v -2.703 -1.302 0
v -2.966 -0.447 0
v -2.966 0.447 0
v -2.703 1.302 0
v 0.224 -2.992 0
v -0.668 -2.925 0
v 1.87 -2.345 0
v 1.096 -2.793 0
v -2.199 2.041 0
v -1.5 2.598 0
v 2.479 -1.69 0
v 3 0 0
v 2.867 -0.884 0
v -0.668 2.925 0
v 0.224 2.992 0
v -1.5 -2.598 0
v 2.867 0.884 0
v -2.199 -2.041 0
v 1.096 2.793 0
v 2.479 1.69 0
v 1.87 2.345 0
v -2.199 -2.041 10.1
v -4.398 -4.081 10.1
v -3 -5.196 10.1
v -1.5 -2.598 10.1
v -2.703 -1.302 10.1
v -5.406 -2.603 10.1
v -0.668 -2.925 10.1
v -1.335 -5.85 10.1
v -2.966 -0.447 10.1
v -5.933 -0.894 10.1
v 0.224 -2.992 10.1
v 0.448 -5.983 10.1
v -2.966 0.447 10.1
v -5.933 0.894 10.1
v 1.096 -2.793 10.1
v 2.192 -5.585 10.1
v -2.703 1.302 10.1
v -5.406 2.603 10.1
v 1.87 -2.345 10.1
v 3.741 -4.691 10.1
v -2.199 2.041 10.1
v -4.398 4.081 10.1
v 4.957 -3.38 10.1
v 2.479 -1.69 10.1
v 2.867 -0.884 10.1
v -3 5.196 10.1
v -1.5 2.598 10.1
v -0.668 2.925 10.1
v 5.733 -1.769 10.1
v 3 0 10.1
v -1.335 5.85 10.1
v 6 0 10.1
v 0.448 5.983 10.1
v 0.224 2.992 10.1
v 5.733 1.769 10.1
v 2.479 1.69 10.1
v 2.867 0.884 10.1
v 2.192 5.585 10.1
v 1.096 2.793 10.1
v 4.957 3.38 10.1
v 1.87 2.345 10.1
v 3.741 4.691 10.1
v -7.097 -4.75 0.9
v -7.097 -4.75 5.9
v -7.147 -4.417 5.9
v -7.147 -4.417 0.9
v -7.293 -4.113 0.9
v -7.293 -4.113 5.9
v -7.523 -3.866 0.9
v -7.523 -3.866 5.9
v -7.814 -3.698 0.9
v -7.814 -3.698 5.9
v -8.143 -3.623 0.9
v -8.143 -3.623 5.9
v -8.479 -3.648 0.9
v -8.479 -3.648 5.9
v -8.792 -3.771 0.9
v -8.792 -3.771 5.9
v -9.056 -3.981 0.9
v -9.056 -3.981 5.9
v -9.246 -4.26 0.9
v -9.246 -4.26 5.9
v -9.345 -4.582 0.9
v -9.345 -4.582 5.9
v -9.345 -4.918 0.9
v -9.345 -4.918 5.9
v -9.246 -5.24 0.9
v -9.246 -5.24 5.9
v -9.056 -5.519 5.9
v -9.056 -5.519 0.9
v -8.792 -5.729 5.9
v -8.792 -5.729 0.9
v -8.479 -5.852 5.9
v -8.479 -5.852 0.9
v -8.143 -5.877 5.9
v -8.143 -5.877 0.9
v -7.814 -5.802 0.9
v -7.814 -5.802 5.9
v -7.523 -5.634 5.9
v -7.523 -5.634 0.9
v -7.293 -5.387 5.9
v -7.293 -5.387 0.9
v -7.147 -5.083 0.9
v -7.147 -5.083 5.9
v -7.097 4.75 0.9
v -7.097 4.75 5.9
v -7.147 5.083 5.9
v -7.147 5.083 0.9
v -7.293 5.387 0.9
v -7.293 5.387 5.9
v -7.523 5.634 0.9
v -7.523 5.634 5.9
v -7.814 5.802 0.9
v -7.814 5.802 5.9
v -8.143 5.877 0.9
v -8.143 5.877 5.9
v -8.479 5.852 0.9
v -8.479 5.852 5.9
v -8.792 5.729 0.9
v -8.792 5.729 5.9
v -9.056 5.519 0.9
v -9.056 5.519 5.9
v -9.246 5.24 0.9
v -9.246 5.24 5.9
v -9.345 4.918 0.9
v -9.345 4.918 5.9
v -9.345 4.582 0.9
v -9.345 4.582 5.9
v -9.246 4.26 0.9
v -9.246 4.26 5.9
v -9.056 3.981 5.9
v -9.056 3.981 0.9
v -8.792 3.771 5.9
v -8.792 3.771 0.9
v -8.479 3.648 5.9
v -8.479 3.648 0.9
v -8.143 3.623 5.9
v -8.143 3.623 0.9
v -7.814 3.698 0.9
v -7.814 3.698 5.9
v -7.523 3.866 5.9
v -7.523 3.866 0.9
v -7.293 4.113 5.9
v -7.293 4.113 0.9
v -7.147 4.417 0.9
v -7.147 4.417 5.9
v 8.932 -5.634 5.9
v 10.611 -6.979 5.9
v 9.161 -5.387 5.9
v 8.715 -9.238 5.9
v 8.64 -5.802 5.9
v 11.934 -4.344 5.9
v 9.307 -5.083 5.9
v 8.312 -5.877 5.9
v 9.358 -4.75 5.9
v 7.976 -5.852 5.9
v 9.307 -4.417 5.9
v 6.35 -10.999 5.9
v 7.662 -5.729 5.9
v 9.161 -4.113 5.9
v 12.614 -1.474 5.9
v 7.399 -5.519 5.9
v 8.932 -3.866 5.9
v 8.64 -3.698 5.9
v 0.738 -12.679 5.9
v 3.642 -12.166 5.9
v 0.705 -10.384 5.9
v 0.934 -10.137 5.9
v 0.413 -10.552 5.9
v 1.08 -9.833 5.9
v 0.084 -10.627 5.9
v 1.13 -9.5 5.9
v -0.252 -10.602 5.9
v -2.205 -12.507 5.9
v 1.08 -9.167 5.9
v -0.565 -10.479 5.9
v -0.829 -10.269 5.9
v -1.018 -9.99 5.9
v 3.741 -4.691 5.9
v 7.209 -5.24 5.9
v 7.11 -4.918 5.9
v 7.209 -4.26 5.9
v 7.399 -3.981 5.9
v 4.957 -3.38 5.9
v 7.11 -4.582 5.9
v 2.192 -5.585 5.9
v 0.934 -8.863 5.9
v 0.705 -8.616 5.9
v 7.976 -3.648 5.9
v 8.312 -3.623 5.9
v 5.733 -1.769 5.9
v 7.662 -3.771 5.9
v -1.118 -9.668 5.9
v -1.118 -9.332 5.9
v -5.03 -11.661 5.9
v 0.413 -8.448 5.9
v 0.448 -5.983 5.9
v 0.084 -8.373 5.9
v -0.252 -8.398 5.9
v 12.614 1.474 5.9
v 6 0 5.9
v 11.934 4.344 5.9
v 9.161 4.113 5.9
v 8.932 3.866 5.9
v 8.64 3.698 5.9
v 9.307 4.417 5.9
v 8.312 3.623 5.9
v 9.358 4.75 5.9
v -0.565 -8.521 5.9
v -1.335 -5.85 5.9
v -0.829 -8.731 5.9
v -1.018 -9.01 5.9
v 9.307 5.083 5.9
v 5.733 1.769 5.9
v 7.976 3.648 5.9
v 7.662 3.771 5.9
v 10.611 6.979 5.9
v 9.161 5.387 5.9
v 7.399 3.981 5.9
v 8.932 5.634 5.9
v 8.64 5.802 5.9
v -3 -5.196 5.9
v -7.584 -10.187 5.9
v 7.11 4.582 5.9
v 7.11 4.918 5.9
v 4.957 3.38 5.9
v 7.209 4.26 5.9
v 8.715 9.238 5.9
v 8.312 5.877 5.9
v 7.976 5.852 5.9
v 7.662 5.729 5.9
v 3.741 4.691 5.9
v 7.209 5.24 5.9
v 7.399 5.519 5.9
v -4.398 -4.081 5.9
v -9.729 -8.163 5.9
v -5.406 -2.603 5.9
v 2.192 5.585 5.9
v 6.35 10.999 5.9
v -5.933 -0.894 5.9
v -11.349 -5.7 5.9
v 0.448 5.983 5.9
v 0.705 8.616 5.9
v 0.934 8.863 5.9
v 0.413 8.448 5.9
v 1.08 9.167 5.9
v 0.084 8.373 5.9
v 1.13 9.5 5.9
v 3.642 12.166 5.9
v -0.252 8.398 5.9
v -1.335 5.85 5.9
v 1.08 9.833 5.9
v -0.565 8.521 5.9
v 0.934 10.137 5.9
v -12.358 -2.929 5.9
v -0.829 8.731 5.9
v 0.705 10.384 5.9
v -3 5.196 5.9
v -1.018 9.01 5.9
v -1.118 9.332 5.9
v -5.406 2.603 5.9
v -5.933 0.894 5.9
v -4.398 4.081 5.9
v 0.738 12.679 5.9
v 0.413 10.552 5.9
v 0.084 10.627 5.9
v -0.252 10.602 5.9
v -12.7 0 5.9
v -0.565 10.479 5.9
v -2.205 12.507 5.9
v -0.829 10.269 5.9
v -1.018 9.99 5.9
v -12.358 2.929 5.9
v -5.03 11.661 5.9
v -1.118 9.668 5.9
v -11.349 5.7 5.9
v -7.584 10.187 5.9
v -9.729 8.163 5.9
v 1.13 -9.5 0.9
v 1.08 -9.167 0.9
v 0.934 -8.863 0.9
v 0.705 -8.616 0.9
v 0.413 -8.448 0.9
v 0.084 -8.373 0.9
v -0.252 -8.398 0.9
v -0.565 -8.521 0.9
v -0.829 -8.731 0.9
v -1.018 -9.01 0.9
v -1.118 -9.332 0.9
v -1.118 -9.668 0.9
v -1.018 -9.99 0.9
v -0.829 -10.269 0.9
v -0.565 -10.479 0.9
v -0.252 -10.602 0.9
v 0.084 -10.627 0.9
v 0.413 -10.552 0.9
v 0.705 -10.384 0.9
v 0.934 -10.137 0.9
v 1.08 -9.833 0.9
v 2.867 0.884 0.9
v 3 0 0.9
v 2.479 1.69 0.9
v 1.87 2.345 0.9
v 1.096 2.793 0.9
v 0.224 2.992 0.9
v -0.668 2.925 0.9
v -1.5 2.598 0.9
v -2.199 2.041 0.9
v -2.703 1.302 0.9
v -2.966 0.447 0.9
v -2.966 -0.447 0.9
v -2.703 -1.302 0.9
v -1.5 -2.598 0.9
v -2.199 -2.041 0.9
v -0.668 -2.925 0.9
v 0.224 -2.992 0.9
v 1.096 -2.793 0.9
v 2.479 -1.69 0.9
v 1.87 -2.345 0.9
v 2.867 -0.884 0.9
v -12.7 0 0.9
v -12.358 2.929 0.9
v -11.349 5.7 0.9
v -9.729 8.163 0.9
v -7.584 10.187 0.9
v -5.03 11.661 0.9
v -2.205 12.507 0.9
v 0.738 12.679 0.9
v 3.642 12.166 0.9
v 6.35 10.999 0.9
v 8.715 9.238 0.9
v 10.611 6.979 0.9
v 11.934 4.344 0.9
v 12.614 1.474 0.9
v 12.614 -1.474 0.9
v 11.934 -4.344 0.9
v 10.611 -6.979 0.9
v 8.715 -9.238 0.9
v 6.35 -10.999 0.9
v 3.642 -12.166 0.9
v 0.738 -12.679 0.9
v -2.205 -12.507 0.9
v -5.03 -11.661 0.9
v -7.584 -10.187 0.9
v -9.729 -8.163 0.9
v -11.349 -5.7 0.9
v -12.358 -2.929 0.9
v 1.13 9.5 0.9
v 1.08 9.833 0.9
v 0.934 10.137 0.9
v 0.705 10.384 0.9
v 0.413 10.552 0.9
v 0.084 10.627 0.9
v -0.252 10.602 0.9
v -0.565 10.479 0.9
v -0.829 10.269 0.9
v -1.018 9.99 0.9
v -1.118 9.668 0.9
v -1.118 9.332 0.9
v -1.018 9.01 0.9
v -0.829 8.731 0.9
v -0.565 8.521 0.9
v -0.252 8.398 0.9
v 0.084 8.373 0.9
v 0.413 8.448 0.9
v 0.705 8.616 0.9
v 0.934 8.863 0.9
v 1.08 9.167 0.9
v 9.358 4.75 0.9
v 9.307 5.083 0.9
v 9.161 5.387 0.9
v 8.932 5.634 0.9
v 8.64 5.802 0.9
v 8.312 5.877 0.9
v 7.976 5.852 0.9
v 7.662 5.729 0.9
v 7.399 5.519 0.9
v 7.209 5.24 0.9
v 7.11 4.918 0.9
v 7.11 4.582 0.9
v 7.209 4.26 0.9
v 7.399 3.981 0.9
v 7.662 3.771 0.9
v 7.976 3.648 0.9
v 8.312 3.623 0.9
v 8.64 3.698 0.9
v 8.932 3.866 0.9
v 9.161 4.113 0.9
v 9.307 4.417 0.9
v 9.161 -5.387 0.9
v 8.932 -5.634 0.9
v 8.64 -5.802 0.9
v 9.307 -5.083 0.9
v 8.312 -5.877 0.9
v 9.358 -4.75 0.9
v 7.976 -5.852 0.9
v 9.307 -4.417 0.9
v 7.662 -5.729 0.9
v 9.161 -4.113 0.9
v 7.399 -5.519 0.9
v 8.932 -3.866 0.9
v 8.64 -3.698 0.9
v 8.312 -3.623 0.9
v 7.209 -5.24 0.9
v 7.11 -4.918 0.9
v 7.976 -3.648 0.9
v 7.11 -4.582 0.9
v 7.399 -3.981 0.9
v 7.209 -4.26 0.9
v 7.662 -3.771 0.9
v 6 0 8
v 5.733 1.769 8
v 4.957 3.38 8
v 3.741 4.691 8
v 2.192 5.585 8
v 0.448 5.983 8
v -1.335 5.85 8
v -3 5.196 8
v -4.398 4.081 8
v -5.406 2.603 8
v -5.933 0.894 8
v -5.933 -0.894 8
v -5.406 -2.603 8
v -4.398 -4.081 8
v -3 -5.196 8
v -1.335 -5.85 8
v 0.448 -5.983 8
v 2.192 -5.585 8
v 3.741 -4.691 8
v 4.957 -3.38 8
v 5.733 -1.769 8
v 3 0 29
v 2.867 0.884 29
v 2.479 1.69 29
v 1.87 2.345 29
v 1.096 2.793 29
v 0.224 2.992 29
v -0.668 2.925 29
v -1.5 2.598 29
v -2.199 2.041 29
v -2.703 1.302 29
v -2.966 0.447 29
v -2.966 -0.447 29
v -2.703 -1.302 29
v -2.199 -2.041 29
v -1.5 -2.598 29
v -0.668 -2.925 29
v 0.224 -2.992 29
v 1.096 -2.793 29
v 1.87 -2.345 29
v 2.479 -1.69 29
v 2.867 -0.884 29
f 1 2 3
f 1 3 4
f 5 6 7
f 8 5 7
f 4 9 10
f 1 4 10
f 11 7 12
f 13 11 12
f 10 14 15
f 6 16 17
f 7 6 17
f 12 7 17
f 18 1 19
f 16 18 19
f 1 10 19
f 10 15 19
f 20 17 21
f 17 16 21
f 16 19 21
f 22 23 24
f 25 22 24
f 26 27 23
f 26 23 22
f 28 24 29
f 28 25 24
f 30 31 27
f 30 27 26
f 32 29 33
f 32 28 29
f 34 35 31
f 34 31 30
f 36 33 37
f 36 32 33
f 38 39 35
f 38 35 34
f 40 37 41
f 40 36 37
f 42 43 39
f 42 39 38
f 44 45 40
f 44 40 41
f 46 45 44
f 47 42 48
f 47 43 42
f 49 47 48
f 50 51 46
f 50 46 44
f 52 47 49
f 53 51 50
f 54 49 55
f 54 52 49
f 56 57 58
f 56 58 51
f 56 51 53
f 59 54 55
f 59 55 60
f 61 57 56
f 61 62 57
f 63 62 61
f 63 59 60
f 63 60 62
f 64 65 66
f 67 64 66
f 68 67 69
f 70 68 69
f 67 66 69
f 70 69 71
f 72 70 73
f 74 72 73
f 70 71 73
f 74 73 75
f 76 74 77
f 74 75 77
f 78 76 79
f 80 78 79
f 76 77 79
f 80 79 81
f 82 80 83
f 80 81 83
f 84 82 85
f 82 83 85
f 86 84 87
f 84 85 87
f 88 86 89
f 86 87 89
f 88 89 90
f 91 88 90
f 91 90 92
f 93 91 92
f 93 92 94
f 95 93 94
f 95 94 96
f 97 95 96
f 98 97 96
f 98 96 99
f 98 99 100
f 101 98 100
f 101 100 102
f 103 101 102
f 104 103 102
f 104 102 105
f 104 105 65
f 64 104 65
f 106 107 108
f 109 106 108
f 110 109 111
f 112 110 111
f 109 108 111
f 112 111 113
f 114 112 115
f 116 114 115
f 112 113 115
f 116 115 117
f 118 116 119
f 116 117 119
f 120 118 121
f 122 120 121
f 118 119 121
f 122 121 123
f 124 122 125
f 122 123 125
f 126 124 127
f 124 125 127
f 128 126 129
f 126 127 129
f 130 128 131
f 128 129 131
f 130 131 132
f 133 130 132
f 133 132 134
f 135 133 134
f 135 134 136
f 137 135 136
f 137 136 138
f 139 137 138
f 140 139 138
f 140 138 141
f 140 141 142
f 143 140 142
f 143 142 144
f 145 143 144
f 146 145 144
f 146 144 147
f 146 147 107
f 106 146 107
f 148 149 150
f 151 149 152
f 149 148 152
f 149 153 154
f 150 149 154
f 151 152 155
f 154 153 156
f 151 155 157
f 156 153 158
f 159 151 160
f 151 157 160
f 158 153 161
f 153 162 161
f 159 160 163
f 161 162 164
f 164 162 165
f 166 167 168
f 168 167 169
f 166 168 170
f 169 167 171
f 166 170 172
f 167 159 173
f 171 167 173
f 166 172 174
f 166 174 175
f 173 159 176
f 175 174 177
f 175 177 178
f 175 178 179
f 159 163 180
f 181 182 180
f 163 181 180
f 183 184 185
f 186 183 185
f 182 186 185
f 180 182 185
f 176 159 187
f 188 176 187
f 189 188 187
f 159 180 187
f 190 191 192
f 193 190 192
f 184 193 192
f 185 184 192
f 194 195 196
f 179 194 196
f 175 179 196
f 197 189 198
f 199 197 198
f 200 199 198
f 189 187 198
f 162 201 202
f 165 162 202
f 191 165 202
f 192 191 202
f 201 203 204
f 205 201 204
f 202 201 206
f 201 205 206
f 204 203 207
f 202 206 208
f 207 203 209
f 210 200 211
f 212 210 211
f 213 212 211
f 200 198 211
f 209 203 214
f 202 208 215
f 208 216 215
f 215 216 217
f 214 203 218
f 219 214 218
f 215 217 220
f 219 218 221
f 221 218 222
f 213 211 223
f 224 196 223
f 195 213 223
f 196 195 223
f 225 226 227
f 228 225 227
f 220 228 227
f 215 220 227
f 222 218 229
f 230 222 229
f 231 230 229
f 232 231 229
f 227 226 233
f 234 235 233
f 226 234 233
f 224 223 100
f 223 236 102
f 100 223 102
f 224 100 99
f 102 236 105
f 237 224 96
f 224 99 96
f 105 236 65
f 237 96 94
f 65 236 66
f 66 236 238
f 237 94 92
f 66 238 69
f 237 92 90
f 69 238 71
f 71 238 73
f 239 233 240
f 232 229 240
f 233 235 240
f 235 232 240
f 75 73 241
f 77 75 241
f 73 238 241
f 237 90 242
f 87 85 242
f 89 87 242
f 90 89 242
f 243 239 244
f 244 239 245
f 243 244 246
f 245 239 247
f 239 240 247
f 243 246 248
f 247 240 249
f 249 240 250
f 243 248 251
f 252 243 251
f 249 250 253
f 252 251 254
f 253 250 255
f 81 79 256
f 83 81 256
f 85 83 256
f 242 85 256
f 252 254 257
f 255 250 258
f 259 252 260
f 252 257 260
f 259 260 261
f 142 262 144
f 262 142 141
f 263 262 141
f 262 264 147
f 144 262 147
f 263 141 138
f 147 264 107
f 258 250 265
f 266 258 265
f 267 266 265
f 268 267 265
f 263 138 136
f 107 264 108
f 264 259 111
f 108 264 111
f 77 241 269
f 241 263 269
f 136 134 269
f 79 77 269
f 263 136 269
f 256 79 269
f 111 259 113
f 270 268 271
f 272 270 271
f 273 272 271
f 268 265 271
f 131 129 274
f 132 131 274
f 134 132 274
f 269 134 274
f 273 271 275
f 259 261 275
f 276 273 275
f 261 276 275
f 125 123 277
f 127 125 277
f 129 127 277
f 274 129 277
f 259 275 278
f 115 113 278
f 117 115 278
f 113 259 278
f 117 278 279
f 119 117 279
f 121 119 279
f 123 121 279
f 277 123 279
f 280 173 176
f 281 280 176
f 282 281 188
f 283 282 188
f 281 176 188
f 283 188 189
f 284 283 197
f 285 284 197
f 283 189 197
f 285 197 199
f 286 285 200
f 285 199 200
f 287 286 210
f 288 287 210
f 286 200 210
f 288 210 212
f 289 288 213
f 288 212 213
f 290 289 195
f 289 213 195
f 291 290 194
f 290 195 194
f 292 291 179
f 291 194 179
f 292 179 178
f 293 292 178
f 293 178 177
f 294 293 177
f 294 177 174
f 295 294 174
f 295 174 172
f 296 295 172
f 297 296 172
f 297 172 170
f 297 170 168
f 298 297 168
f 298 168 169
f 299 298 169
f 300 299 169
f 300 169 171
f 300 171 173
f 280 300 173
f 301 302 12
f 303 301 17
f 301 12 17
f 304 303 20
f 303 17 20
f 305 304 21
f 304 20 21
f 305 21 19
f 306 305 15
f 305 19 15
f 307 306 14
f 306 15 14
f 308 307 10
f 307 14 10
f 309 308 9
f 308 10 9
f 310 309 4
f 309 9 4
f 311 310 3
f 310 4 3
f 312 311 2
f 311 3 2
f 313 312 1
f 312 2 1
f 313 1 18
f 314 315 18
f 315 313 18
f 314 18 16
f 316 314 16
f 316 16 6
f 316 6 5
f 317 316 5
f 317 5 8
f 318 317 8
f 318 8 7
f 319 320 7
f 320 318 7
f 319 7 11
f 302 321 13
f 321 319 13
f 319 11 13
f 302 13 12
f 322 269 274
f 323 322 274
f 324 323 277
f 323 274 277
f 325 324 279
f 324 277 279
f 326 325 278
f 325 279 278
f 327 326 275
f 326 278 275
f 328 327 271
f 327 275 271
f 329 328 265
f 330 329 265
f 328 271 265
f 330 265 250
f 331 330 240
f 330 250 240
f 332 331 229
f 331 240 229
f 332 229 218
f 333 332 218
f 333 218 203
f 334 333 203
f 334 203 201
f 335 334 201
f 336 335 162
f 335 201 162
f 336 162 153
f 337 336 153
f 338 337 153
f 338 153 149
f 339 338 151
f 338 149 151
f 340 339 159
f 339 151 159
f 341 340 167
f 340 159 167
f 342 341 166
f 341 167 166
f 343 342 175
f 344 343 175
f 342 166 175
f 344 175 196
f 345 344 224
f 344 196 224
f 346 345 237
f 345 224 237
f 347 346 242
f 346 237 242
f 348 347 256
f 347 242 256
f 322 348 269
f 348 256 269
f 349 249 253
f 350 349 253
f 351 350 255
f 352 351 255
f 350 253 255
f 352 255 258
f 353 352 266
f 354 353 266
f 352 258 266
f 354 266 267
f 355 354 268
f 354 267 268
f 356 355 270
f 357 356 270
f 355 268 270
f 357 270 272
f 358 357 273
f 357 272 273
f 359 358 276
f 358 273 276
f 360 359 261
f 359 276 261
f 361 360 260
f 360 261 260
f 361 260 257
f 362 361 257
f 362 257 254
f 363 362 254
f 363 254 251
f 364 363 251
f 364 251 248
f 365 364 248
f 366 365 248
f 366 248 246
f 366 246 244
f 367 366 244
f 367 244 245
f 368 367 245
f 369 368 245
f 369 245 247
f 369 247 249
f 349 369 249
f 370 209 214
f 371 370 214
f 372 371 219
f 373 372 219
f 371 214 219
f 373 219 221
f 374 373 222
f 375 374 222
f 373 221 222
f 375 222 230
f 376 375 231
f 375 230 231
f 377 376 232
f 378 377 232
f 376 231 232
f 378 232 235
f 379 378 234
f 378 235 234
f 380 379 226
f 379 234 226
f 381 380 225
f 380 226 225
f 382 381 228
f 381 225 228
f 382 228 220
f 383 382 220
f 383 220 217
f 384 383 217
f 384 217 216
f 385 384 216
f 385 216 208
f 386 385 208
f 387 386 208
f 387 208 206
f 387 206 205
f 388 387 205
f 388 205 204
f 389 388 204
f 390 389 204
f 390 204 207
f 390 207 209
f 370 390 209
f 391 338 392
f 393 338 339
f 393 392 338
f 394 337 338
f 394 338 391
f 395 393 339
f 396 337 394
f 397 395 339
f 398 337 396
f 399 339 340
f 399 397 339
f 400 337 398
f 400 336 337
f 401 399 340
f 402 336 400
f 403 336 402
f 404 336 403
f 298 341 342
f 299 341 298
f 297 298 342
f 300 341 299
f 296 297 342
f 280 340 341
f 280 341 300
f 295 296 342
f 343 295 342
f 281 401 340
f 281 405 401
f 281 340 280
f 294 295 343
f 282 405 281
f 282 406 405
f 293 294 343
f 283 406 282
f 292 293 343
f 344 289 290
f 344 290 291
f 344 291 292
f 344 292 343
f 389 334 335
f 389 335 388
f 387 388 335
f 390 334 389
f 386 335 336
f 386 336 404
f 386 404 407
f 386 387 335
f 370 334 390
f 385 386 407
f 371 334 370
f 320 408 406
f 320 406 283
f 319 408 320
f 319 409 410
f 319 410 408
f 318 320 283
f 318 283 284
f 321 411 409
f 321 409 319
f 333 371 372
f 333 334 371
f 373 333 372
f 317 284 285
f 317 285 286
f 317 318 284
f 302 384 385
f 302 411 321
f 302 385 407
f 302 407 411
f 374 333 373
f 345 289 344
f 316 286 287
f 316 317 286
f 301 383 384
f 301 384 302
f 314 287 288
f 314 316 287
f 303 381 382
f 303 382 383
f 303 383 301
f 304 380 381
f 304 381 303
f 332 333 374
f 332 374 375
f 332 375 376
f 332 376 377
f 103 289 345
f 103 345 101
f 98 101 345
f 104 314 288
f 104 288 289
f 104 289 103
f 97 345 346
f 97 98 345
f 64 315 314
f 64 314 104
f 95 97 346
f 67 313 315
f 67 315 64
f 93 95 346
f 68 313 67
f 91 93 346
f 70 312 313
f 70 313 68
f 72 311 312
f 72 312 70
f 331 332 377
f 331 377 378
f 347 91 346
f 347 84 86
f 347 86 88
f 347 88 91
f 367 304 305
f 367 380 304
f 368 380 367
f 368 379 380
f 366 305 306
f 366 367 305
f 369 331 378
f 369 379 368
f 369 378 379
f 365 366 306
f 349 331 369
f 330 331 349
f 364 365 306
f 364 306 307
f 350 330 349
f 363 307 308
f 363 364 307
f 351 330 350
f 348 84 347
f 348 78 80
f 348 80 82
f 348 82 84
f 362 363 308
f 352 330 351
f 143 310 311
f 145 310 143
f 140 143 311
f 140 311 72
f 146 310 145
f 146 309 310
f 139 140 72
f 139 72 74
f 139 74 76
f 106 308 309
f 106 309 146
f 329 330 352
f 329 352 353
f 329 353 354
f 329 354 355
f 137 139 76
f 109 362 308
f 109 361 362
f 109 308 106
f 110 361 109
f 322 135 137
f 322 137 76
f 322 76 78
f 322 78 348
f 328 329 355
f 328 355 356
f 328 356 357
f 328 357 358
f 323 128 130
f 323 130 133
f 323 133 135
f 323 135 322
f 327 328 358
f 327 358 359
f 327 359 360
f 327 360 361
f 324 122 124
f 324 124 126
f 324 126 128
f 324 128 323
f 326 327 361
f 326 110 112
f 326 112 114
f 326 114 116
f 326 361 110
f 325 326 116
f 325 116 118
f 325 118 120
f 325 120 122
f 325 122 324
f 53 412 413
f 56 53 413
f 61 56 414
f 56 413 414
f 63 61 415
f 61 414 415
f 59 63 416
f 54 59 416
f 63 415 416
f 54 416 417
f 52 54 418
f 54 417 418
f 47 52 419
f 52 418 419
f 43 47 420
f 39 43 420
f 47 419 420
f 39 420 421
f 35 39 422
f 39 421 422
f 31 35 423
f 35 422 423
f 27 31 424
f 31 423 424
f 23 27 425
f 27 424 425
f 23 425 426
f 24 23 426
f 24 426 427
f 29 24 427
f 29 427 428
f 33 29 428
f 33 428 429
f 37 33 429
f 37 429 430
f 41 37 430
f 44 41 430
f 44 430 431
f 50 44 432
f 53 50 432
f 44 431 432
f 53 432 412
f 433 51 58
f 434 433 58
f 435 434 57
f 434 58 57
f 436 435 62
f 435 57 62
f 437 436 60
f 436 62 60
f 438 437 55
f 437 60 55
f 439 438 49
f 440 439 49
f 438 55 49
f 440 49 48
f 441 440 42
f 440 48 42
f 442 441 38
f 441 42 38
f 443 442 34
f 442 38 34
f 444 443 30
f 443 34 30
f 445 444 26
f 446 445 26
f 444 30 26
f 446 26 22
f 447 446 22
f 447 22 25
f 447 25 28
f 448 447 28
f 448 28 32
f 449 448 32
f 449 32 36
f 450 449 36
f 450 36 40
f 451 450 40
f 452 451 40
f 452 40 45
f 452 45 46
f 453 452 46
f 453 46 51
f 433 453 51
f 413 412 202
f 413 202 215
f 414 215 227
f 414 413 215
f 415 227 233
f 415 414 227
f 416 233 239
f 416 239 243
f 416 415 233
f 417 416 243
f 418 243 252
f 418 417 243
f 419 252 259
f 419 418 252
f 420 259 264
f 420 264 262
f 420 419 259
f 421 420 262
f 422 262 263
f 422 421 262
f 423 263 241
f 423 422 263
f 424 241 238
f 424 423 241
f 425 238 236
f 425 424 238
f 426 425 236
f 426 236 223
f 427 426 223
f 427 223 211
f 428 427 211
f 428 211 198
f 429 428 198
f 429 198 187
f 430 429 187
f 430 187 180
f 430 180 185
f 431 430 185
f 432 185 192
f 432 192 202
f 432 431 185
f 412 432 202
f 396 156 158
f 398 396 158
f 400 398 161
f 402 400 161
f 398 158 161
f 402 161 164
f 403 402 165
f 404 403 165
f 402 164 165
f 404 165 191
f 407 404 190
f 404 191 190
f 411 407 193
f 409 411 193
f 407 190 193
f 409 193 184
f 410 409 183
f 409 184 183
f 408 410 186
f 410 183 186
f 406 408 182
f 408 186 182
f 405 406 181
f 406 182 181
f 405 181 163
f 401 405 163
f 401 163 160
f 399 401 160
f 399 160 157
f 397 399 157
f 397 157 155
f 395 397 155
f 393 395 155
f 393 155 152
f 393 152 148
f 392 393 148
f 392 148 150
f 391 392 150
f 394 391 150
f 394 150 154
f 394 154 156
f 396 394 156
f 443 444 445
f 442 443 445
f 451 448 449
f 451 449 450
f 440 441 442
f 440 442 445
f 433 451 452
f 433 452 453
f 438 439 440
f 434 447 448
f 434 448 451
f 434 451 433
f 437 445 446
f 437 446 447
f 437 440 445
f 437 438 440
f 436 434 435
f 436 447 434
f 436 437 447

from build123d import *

# Parameters (mm, degrees)
SKETCH1_R                 = 3
BOSS_EXTRUDE1_DEPTH       = 29
SKETCH2_R                 = 6
BOSS_EXTRUDE2_DEPTH       = 2.1
SKETCH3_R                 = 12.7
BOSS_EXTRUDE3_DEPTH       = 5
SKETCH4_R                 = 6
BOSS_EXTRUDE4_DEPTH       = 2.1
F_4_40_TAPPED_HOLE1_D     = 2.2606
F_4_40_TAPPED_HOLE1_DEPTH = 7.6
F_4_40_TAPPED_HOLE1_TIP   = 0.679152758


with BuildPart() as part:
    # Sketch1 → Boss-Extrude1 (new body)
    with BuildSketch(Plane.XY):
        Circle(SKETCH1_R)
    extrude(amount=BOSS_EXTRUDE1_DEPTH)

    # Sketch2 → Boss-Extrude2 (add)
    with BuildSketch(Plane.XY.offset(8)):
        Circle(SKETCH2_R)
    extrude(amount=-BOSS_EXTRUDE2_DEPTH)

    # Sketch3 → Boss-Extrude3 (add)
    with BuildSketch(Plane(origin=(0, 0, 5.9), x_dir=(-1, 0, 0), z_dir=(0, 0, -1))):
        Circle(SKETCH3_R)
    extrude(amount=BOSS_EXTRUDE3_DEPTH)

    # Sketch4 → Boss-Extrude4 (add)
    with BuildSketch(Plane.XY.offset(8)):
        Circle(SKETCH4_R)
    extrude(amount=BOSS_EXTRUDE4_DEPTH)

    # #4-40 Tapped Hole1
    with Locations(Plane(origin=(0, 0, 0.9), x_dir=(-1, 0, 0), z_dir=(0, 0, -1))):
        with Locations((8.227241336, 4.75), (8.227241336, -4.75), (0, -9.5), (-8.227241336, -4.75), (-8.227241336, 4.75), (0, 9.5)):
            Hole(F_4_40_TAPPED_HOLE1_D / 2, depth=F_4_40_TAPPED_HOLE1_DEPTH)
            with Locations((0, 0, -(F_4_40_TAPPED_HOLE1_DEPTH + F_4_40_TAPPED_HOLE1_TIP / 2))):  # 118° drill point
                Cone(0, F_4_40_TAPPED_HOLE1_D / 2, F_4_40_TAPPED_HOLE1_TIP, mode=Mode.SUBTRACT)


solid = part.part
